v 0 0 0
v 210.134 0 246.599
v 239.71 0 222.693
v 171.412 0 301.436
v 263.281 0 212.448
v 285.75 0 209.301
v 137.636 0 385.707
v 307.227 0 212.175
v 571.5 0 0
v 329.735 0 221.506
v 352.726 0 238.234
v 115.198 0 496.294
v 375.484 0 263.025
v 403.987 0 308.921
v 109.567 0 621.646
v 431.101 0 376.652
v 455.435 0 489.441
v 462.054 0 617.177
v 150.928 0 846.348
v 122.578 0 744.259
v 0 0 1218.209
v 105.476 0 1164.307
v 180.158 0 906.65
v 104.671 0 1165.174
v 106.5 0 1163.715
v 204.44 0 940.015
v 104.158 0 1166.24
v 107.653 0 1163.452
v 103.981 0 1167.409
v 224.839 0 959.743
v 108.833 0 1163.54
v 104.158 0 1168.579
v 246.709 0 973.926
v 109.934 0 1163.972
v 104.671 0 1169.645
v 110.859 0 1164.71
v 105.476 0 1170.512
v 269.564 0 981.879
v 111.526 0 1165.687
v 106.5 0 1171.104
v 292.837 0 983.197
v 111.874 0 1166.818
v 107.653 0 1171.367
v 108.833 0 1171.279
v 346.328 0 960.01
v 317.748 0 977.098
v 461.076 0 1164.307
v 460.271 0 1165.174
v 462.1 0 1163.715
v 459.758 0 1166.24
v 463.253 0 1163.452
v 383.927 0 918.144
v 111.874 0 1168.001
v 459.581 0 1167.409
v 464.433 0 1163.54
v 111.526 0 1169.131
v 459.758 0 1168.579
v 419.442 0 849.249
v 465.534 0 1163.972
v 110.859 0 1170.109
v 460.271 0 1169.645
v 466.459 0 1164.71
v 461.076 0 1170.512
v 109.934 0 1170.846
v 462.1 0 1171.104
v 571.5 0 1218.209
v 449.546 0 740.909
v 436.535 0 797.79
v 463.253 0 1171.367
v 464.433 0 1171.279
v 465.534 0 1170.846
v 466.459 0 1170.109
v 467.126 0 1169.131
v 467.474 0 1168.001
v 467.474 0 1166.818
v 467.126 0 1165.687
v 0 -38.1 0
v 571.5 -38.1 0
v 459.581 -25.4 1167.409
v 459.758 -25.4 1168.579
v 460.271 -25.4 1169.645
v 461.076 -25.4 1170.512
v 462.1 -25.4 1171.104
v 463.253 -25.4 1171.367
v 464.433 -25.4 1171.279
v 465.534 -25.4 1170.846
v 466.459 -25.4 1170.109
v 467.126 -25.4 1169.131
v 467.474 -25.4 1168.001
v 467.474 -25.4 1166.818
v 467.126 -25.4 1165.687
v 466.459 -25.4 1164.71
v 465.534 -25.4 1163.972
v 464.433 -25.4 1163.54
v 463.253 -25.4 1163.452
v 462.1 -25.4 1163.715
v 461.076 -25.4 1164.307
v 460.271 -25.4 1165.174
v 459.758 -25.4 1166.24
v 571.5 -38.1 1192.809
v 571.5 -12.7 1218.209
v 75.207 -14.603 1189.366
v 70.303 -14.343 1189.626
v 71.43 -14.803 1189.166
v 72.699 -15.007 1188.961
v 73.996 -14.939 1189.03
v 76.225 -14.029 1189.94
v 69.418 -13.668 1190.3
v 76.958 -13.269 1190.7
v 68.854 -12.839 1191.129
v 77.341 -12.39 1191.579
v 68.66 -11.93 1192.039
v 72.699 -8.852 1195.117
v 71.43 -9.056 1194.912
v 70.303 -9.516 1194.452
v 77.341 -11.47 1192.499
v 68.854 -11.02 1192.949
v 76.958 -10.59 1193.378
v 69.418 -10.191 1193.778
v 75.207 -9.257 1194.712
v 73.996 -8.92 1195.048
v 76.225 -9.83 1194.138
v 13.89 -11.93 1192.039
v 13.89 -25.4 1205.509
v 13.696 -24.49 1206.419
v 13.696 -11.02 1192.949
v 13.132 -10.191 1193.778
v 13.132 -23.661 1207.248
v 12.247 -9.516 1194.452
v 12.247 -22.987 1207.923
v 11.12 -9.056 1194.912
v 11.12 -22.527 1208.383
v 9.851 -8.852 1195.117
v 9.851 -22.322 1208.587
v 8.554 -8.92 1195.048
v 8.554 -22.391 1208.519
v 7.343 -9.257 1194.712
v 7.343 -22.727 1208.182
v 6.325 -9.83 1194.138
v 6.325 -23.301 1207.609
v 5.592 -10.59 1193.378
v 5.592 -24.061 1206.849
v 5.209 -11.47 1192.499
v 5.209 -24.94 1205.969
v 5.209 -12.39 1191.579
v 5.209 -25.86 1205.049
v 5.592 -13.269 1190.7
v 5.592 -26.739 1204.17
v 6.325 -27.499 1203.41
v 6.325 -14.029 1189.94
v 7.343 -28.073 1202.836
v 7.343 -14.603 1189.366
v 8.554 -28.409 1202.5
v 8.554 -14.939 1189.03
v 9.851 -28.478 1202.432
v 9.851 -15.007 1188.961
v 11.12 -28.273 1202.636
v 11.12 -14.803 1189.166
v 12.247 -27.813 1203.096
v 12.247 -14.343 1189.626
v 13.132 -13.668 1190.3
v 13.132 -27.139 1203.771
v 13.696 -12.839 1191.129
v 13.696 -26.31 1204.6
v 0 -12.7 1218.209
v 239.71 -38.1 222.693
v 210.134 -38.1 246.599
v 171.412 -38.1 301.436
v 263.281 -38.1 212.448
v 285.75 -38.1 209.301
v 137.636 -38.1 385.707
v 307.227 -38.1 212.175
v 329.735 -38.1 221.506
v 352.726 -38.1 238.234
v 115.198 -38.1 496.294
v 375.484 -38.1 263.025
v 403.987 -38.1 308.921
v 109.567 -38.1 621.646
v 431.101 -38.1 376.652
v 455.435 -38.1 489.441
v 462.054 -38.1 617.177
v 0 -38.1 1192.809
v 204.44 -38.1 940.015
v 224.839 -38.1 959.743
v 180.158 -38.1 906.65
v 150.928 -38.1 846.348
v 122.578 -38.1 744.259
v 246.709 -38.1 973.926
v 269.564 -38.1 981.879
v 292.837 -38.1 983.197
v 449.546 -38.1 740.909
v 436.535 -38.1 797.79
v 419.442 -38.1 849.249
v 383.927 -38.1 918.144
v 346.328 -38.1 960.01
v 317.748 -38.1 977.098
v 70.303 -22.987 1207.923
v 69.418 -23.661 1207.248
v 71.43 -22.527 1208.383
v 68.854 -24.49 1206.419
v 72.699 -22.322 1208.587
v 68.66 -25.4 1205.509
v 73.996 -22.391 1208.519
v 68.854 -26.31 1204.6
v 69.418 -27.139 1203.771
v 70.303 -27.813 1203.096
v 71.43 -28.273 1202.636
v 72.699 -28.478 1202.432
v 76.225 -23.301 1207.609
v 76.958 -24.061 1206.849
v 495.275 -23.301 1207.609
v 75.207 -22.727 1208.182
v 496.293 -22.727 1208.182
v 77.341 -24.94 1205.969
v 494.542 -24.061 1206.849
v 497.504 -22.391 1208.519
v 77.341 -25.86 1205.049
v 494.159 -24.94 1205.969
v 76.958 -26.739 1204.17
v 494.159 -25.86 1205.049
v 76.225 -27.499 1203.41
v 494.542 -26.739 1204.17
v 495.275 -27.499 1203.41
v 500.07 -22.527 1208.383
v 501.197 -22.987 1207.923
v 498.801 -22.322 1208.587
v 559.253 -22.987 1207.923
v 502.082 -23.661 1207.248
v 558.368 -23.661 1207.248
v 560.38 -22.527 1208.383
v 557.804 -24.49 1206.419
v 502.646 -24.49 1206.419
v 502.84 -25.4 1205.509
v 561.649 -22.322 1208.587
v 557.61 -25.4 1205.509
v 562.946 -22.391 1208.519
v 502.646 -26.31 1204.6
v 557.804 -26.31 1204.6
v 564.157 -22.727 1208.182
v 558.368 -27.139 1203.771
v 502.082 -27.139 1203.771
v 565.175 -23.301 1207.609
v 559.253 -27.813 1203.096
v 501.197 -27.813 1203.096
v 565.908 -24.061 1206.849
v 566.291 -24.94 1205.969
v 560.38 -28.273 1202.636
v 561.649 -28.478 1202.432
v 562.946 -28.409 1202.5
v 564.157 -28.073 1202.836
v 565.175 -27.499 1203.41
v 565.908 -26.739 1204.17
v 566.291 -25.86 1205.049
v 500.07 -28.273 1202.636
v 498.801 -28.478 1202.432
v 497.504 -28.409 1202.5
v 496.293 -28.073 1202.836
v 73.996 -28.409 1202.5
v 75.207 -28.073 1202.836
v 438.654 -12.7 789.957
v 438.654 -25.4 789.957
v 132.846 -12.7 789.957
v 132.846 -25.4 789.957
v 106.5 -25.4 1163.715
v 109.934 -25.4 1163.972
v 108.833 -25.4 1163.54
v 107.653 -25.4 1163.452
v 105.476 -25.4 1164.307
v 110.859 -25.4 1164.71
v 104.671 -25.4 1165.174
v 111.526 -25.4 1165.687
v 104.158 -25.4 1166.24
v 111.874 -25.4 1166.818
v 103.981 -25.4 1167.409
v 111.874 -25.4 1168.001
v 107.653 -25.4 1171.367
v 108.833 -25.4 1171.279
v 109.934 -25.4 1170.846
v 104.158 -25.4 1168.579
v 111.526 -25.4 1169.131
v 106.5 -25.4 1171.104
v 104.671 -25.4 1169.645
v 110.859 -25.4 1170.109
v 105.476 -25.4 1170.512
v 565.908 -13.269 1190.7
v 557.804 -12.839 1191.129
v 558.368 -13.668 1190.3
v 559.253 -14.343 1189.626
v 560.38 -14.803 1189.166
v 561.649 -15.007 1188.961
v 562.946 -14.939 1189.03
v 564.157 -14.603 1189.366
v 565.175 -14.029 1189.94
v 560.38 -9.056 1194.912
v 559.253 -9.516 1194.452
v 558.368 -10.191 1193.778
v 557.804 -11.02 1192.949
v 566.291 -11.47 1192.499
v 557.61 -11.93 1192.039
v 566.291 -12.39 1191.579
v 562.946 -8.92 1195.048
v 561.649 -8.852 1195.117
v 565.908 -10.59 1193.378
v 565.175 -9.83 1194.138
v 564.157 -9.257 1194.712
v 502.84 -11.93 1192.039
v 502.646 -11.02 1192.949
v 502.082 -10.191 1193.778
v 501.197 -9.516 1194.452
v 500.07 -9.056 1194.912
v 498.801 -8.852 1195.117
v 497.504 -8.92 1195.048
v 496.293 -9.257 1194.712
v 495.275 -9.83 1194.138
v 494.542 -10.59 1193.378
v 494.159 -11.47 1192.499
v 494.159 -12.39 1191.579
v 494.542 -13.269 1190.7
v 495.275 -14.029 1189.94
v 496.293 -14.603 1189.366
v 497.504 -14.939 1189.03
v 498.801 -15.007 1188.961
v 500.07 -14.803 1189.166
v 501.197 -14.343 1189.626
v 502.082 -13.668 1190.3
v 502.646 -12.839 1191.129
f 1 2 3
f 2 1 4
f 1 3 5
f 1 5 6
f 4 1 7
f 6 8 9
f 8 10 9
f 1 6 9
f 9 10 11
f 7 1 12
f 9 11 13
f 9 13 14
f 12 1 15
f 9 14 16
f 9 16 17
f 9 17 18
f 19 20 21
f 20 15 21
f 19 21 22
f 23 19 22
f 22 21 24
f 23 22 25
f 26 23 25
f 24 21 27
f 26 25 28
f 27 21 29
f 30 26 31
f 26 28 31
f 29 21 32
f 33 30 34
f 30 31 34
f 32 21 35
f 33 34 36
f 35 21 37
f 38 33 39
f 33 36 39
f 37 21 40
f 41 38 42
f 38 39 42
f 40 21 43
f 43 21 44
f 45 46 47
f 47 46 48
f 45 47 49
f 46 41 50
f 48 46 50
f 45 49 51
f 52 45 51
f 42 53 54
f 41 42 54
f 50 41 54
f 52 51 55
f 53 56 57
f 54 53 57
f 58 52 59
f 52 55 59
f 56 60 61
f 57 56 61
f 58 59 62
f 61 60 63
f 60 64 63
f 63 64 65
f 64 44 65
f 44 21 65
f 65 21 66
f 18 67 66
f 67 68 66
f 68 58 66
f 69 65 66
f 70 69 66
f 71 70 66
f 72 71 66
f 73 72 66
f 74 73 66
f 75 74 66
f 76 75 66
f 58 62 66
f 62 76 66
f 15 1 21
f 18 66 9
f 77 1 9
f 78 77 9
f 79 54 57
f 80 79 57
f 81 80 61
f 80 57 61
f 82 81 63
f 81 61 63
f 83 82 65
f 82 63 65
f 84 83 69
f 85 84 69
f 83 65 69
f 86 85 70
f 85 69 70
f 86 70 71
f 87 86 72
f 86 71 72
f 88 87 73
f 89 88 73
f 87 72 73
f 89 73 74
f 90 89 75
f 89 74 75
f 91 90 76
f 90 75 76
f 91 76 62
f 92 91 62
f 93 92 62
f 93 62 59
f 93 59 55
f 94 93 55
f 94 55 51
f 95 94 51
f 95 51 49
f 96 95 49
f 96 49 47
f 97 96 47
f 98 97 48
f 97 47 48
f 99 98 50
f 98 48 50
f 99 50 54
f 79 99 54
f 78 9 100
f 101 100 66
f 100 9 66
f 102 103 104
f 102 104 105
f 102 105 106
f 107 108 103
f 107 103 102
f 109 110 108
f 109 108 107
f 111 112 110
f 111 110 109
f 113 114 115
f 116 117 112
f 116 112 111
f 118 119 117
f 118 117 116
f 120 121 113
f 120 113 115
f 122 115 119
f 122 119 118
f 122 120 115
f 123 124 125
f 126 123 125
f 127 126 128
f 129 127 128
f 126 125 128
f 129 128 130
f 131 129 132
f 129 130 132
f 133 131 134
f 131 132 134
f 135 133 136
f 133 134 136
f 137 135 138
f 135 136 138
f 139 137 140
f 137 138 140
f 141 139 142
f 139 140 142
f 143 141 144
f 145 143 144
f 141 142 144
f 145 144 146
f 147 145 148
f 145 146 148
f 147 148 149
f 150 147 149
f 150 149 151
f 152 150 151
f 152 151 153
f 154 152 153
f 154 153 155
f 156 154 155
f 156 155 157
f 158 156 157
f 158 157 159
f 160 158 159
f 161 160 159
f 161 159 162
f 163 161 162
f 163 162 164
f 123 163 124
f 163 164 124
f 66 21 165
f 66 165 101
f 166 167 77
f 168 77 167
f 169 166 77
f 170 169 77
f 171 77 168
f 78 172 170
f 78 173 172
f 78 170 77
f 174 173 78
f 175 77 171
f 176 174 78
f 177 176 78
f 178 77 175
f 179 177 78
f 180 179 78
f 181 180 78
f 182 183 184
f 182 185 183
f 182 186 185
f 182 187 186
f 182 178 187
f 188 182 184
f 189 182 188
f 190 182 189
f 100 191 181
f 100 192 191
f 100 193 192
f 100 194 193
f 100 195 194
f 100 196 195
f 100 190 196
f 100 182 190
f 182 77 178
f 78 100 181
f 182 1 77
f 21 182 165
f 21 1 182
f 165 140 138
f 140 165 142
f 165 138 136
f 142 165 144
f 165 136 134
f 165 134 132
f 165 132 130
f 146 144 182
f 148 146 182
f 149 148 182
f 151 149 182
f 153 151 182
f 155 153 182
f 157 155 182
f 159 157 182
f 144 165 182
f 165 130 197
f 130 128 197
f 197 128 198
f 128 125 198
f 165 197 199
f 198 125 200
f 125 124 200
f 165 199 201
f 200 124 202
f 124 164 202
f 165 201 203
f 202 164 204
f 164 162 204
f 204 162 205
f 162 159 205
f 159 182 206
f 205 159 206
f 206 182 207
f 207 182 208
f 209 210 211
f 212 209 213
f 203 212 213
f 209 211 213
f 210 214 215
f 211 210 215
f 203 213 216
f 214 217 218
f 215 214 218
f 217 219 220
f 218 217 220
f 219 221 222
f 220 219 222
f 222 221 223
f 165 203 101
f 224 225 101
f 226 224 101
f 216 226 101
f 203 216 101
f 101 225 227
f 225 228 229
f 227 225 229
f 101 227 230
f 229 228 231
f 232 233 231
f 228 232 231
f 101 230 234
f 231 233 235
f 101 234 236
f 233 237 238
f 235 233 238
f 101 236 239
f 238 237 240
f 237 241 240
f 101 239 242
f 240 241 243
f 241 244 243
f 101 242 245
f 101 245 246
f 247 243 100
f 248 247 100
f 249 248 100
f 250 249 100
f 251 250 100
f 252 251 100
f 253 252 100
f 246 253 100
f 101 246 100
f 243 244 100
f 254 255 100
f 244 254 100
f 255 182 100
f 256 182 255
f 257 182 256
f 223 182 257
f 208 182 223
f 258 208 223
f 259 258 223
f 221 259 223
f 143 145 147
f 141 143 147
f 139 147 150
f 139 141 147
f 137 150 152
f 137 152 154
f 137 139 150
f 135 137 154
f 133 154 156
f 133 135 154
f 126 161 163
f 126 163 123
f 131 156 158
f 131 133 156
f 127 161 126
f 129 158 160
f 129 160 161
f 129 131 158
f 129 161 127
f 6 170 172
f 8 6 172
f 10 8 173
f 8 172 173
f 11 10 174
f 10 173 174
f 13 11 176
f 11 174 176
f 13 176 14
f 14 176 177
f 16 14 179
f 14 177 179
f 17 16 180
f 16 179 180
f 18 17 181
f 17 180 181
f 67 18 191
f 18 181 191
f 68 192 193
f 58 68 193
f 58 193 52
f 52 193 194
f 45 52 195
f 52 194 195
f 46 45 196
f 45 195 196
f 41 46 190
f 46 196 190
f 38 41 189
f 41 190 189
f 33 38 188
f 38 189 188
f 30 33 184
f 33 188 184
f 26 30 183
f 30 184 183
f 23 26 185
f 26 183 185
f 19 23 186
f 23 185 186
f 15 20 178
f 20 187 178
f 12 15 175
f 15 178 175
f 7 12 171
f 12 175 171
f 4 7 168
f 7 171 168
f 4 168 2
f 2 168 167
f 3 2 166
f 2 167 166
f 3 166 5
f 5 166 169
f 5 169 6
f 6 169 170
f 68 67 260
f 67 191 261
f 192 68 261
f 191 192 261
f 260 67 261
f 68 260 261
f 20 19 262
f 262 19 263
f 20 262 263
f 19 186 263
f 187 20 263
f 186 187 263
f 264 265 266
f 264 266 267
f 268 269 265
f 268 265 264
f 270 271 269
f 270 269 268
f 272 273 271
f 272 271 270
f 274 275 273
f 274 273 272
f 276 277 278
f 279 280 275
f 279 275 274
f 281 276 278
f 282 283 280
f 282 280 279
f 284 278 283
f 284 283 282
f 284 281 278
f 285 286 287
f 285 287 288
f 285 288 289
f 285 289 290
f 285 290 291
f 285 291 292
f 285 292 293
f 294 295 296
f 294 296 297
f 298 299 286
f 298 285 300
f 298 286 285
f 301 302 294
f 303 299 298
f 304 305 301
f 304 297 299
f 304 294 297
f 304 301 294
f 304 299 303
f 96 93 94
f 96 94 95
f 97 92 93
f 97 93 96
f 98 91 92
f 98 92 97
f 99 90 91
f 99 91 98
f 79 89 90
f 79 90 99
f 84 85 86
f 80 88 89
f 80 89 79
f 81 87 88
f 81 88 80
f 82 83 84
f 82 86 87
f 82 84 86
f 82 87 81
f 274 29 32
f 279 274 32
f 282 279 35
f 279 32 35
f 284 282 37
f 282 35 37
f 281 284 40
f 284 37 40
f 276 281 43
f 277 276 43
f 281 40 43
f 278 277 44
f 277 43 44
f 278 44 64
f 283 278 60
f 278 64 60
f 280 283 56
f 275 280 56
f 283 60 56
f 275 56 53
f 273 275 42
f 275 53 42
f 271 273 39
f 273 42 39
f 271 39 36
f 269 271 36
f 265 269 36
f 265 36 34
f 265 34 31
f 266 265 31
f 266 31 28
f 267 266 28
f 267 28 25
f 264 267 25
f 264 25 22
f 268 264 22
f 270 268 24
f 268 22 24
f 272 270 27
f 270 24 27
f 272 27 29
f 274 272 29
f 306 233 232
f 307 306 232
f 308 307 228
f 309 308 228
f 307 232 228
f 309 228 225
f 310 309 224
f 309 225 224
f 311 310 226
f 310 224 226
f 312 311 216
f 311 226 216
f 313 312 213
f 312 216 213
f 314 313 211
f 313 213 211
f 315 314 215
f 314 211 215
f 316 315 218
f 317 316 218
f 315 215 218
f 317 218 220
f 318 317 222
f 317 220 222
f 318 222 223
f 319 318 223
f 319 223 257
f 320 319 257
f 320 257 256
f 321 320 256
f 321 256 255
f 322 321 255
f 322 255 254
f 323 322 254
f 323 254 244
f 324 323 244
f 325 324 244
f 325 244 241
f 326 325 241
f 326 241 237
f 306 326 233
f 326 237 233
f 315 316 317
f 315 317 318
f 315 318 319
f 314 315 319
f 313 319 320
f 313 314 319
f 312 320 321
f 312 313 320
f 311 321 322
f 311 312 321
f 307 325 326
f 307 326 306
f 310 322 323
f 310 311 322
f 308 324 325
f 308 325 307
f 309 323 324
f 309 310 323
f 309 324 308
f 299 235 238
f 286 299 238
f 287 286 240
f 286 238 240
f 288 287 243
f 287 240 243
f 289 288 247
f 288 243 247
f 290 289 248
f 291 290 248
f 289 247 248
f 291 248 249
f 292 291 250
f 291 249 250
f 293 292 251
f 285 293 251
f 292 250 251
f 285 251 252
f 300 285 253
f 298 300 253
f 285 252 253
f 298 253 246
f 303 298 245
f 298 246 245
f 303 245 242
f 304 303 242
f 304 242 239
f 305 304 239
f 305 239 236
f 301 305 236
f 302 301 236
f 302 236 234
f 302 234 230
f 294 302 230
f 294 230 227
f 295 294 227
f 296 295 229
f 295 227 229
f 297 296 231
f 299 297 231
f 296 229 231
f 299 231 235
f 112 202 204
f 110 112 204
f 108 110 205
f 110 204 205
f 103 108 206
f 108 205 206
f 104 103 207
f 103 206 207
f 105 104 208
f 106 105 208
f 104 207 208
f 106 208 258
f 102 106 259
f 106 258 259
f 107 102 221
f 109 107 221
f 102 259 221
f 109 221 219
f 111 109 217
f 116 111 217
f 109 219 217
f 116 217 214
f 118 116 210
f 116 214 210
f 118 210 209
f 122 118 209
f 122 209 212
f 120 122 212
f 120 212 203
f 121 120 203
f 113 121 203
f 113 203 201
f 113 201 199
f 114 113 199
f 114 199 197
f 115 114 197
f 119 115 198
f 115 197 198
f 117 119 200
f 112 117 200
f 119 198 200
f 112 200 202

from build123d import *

# Parameters (mm, degrees)
F0_W     = 571.5
F0_H     = 1218.2094
F1_DEPTH = 38.1
F2_SIZE2 = 25.4
F2_SIZE  = 25.4
F4_DEPTH = 38.1
F5_R     = 4.36499
F6_DEPTH = 19.05
F7_R     = 3.96875
F8_DEPTH = 25.4


with BuildPart() as f1:
    # F0 (on Front) → F1 (new body)
    with BuildSketch(Plane.XZ):
        with Locations((285.75, 609.1047)):
            Rectangle(F0_W, F0_H)
    extrude(amount=F1_DEPTH)

    # F2
    f2_edges = [f1.edges().sort_by_distance(p)[0] for p in [
        (285.75, -38.1, 1218.2094),
    ]]
    chamfer(f2_edges, length=F2_SIZE, length2=F2_SIZE2)

    # F3 (on face) → F4 (cut)
    with BuildSketch(Plane.XZ.offset(38.1)):
        with BuildLine():
            add(Edge.make_bspline(
                [(285.75, 209.300756), (591.55855, 209.300756), (438.654275, 789.956672), (285.75, 1370.612587), (132.845725, 789.956672), (-20.05855, 209.300756), (285.75, 209.300756)],
                knots=[0, 0, 0, 2.094395, 2.094395, 4.18879, 4.18879, 6.283185, 6.283185, 6.283185], degree=2, weights=[1, 0.5, 1, 0.5, 1, 0.5, 1]))
        make_face()
    extrude(amount=-F4_DEPTH, mode=Mode.SUBTRACT)

    # F5 (on face) → F6 (cut)
    with BuildSketch(Plane(origin=(0, -615.4547, 615.4547), x_dir=(1, 0, 0), z_dir=(0, -0.707107, 0.707107))):
        with Locations((9.525, 834.463359)):
            Circle(F5_R)
        with BuildLine():
            ThreePointArc((77.38999, 834.463359), (73.025, 838.828349), (68.66001, 834.463359))
            ThreePointArc((68.66001, 834.463359), (73.025, 830.098369), (77.38999, 834.463359))
        make_face()
        with Locations((498.475, 834.463359)):
            Circle(F5_R)
        with BuildLine():
            ThreePointArc((566.33999, 834.463359), (561.975, 838.828349), (557.61001, 834.463359))
            ThreePointArc((557.61001, 834.463359), (561.975, 830.098369), (566.33999, 834.463359))
        make_face()
    extrude(amount=-F6_DEPTH, mode=Mode.SUBTRACT)

    # F7 (on face) → F8 (cut)
    with BuildSketch(Plane(origin=(0, 0, 0), x_dir=(-1, 0, 0), z_dir=(0, 1, 0))):
        with BuildLine():
            ThreePointArc((-467.51875, 1167.4094), (-463.55, 1163.44065), (-459.58125, 1167.4094))
            ThreePointArc((-459.58125, 1167.4094), (-463.55, 1171.37815), (-467.51875, 1167.4094))
        make_face()
        with Locations((-107.95, 1167.4094)):
            Circle(F7_R)
    extrude(amount=-F8_DEPTH, mode=Mode.SUBTRACT)


solid = f1.part
